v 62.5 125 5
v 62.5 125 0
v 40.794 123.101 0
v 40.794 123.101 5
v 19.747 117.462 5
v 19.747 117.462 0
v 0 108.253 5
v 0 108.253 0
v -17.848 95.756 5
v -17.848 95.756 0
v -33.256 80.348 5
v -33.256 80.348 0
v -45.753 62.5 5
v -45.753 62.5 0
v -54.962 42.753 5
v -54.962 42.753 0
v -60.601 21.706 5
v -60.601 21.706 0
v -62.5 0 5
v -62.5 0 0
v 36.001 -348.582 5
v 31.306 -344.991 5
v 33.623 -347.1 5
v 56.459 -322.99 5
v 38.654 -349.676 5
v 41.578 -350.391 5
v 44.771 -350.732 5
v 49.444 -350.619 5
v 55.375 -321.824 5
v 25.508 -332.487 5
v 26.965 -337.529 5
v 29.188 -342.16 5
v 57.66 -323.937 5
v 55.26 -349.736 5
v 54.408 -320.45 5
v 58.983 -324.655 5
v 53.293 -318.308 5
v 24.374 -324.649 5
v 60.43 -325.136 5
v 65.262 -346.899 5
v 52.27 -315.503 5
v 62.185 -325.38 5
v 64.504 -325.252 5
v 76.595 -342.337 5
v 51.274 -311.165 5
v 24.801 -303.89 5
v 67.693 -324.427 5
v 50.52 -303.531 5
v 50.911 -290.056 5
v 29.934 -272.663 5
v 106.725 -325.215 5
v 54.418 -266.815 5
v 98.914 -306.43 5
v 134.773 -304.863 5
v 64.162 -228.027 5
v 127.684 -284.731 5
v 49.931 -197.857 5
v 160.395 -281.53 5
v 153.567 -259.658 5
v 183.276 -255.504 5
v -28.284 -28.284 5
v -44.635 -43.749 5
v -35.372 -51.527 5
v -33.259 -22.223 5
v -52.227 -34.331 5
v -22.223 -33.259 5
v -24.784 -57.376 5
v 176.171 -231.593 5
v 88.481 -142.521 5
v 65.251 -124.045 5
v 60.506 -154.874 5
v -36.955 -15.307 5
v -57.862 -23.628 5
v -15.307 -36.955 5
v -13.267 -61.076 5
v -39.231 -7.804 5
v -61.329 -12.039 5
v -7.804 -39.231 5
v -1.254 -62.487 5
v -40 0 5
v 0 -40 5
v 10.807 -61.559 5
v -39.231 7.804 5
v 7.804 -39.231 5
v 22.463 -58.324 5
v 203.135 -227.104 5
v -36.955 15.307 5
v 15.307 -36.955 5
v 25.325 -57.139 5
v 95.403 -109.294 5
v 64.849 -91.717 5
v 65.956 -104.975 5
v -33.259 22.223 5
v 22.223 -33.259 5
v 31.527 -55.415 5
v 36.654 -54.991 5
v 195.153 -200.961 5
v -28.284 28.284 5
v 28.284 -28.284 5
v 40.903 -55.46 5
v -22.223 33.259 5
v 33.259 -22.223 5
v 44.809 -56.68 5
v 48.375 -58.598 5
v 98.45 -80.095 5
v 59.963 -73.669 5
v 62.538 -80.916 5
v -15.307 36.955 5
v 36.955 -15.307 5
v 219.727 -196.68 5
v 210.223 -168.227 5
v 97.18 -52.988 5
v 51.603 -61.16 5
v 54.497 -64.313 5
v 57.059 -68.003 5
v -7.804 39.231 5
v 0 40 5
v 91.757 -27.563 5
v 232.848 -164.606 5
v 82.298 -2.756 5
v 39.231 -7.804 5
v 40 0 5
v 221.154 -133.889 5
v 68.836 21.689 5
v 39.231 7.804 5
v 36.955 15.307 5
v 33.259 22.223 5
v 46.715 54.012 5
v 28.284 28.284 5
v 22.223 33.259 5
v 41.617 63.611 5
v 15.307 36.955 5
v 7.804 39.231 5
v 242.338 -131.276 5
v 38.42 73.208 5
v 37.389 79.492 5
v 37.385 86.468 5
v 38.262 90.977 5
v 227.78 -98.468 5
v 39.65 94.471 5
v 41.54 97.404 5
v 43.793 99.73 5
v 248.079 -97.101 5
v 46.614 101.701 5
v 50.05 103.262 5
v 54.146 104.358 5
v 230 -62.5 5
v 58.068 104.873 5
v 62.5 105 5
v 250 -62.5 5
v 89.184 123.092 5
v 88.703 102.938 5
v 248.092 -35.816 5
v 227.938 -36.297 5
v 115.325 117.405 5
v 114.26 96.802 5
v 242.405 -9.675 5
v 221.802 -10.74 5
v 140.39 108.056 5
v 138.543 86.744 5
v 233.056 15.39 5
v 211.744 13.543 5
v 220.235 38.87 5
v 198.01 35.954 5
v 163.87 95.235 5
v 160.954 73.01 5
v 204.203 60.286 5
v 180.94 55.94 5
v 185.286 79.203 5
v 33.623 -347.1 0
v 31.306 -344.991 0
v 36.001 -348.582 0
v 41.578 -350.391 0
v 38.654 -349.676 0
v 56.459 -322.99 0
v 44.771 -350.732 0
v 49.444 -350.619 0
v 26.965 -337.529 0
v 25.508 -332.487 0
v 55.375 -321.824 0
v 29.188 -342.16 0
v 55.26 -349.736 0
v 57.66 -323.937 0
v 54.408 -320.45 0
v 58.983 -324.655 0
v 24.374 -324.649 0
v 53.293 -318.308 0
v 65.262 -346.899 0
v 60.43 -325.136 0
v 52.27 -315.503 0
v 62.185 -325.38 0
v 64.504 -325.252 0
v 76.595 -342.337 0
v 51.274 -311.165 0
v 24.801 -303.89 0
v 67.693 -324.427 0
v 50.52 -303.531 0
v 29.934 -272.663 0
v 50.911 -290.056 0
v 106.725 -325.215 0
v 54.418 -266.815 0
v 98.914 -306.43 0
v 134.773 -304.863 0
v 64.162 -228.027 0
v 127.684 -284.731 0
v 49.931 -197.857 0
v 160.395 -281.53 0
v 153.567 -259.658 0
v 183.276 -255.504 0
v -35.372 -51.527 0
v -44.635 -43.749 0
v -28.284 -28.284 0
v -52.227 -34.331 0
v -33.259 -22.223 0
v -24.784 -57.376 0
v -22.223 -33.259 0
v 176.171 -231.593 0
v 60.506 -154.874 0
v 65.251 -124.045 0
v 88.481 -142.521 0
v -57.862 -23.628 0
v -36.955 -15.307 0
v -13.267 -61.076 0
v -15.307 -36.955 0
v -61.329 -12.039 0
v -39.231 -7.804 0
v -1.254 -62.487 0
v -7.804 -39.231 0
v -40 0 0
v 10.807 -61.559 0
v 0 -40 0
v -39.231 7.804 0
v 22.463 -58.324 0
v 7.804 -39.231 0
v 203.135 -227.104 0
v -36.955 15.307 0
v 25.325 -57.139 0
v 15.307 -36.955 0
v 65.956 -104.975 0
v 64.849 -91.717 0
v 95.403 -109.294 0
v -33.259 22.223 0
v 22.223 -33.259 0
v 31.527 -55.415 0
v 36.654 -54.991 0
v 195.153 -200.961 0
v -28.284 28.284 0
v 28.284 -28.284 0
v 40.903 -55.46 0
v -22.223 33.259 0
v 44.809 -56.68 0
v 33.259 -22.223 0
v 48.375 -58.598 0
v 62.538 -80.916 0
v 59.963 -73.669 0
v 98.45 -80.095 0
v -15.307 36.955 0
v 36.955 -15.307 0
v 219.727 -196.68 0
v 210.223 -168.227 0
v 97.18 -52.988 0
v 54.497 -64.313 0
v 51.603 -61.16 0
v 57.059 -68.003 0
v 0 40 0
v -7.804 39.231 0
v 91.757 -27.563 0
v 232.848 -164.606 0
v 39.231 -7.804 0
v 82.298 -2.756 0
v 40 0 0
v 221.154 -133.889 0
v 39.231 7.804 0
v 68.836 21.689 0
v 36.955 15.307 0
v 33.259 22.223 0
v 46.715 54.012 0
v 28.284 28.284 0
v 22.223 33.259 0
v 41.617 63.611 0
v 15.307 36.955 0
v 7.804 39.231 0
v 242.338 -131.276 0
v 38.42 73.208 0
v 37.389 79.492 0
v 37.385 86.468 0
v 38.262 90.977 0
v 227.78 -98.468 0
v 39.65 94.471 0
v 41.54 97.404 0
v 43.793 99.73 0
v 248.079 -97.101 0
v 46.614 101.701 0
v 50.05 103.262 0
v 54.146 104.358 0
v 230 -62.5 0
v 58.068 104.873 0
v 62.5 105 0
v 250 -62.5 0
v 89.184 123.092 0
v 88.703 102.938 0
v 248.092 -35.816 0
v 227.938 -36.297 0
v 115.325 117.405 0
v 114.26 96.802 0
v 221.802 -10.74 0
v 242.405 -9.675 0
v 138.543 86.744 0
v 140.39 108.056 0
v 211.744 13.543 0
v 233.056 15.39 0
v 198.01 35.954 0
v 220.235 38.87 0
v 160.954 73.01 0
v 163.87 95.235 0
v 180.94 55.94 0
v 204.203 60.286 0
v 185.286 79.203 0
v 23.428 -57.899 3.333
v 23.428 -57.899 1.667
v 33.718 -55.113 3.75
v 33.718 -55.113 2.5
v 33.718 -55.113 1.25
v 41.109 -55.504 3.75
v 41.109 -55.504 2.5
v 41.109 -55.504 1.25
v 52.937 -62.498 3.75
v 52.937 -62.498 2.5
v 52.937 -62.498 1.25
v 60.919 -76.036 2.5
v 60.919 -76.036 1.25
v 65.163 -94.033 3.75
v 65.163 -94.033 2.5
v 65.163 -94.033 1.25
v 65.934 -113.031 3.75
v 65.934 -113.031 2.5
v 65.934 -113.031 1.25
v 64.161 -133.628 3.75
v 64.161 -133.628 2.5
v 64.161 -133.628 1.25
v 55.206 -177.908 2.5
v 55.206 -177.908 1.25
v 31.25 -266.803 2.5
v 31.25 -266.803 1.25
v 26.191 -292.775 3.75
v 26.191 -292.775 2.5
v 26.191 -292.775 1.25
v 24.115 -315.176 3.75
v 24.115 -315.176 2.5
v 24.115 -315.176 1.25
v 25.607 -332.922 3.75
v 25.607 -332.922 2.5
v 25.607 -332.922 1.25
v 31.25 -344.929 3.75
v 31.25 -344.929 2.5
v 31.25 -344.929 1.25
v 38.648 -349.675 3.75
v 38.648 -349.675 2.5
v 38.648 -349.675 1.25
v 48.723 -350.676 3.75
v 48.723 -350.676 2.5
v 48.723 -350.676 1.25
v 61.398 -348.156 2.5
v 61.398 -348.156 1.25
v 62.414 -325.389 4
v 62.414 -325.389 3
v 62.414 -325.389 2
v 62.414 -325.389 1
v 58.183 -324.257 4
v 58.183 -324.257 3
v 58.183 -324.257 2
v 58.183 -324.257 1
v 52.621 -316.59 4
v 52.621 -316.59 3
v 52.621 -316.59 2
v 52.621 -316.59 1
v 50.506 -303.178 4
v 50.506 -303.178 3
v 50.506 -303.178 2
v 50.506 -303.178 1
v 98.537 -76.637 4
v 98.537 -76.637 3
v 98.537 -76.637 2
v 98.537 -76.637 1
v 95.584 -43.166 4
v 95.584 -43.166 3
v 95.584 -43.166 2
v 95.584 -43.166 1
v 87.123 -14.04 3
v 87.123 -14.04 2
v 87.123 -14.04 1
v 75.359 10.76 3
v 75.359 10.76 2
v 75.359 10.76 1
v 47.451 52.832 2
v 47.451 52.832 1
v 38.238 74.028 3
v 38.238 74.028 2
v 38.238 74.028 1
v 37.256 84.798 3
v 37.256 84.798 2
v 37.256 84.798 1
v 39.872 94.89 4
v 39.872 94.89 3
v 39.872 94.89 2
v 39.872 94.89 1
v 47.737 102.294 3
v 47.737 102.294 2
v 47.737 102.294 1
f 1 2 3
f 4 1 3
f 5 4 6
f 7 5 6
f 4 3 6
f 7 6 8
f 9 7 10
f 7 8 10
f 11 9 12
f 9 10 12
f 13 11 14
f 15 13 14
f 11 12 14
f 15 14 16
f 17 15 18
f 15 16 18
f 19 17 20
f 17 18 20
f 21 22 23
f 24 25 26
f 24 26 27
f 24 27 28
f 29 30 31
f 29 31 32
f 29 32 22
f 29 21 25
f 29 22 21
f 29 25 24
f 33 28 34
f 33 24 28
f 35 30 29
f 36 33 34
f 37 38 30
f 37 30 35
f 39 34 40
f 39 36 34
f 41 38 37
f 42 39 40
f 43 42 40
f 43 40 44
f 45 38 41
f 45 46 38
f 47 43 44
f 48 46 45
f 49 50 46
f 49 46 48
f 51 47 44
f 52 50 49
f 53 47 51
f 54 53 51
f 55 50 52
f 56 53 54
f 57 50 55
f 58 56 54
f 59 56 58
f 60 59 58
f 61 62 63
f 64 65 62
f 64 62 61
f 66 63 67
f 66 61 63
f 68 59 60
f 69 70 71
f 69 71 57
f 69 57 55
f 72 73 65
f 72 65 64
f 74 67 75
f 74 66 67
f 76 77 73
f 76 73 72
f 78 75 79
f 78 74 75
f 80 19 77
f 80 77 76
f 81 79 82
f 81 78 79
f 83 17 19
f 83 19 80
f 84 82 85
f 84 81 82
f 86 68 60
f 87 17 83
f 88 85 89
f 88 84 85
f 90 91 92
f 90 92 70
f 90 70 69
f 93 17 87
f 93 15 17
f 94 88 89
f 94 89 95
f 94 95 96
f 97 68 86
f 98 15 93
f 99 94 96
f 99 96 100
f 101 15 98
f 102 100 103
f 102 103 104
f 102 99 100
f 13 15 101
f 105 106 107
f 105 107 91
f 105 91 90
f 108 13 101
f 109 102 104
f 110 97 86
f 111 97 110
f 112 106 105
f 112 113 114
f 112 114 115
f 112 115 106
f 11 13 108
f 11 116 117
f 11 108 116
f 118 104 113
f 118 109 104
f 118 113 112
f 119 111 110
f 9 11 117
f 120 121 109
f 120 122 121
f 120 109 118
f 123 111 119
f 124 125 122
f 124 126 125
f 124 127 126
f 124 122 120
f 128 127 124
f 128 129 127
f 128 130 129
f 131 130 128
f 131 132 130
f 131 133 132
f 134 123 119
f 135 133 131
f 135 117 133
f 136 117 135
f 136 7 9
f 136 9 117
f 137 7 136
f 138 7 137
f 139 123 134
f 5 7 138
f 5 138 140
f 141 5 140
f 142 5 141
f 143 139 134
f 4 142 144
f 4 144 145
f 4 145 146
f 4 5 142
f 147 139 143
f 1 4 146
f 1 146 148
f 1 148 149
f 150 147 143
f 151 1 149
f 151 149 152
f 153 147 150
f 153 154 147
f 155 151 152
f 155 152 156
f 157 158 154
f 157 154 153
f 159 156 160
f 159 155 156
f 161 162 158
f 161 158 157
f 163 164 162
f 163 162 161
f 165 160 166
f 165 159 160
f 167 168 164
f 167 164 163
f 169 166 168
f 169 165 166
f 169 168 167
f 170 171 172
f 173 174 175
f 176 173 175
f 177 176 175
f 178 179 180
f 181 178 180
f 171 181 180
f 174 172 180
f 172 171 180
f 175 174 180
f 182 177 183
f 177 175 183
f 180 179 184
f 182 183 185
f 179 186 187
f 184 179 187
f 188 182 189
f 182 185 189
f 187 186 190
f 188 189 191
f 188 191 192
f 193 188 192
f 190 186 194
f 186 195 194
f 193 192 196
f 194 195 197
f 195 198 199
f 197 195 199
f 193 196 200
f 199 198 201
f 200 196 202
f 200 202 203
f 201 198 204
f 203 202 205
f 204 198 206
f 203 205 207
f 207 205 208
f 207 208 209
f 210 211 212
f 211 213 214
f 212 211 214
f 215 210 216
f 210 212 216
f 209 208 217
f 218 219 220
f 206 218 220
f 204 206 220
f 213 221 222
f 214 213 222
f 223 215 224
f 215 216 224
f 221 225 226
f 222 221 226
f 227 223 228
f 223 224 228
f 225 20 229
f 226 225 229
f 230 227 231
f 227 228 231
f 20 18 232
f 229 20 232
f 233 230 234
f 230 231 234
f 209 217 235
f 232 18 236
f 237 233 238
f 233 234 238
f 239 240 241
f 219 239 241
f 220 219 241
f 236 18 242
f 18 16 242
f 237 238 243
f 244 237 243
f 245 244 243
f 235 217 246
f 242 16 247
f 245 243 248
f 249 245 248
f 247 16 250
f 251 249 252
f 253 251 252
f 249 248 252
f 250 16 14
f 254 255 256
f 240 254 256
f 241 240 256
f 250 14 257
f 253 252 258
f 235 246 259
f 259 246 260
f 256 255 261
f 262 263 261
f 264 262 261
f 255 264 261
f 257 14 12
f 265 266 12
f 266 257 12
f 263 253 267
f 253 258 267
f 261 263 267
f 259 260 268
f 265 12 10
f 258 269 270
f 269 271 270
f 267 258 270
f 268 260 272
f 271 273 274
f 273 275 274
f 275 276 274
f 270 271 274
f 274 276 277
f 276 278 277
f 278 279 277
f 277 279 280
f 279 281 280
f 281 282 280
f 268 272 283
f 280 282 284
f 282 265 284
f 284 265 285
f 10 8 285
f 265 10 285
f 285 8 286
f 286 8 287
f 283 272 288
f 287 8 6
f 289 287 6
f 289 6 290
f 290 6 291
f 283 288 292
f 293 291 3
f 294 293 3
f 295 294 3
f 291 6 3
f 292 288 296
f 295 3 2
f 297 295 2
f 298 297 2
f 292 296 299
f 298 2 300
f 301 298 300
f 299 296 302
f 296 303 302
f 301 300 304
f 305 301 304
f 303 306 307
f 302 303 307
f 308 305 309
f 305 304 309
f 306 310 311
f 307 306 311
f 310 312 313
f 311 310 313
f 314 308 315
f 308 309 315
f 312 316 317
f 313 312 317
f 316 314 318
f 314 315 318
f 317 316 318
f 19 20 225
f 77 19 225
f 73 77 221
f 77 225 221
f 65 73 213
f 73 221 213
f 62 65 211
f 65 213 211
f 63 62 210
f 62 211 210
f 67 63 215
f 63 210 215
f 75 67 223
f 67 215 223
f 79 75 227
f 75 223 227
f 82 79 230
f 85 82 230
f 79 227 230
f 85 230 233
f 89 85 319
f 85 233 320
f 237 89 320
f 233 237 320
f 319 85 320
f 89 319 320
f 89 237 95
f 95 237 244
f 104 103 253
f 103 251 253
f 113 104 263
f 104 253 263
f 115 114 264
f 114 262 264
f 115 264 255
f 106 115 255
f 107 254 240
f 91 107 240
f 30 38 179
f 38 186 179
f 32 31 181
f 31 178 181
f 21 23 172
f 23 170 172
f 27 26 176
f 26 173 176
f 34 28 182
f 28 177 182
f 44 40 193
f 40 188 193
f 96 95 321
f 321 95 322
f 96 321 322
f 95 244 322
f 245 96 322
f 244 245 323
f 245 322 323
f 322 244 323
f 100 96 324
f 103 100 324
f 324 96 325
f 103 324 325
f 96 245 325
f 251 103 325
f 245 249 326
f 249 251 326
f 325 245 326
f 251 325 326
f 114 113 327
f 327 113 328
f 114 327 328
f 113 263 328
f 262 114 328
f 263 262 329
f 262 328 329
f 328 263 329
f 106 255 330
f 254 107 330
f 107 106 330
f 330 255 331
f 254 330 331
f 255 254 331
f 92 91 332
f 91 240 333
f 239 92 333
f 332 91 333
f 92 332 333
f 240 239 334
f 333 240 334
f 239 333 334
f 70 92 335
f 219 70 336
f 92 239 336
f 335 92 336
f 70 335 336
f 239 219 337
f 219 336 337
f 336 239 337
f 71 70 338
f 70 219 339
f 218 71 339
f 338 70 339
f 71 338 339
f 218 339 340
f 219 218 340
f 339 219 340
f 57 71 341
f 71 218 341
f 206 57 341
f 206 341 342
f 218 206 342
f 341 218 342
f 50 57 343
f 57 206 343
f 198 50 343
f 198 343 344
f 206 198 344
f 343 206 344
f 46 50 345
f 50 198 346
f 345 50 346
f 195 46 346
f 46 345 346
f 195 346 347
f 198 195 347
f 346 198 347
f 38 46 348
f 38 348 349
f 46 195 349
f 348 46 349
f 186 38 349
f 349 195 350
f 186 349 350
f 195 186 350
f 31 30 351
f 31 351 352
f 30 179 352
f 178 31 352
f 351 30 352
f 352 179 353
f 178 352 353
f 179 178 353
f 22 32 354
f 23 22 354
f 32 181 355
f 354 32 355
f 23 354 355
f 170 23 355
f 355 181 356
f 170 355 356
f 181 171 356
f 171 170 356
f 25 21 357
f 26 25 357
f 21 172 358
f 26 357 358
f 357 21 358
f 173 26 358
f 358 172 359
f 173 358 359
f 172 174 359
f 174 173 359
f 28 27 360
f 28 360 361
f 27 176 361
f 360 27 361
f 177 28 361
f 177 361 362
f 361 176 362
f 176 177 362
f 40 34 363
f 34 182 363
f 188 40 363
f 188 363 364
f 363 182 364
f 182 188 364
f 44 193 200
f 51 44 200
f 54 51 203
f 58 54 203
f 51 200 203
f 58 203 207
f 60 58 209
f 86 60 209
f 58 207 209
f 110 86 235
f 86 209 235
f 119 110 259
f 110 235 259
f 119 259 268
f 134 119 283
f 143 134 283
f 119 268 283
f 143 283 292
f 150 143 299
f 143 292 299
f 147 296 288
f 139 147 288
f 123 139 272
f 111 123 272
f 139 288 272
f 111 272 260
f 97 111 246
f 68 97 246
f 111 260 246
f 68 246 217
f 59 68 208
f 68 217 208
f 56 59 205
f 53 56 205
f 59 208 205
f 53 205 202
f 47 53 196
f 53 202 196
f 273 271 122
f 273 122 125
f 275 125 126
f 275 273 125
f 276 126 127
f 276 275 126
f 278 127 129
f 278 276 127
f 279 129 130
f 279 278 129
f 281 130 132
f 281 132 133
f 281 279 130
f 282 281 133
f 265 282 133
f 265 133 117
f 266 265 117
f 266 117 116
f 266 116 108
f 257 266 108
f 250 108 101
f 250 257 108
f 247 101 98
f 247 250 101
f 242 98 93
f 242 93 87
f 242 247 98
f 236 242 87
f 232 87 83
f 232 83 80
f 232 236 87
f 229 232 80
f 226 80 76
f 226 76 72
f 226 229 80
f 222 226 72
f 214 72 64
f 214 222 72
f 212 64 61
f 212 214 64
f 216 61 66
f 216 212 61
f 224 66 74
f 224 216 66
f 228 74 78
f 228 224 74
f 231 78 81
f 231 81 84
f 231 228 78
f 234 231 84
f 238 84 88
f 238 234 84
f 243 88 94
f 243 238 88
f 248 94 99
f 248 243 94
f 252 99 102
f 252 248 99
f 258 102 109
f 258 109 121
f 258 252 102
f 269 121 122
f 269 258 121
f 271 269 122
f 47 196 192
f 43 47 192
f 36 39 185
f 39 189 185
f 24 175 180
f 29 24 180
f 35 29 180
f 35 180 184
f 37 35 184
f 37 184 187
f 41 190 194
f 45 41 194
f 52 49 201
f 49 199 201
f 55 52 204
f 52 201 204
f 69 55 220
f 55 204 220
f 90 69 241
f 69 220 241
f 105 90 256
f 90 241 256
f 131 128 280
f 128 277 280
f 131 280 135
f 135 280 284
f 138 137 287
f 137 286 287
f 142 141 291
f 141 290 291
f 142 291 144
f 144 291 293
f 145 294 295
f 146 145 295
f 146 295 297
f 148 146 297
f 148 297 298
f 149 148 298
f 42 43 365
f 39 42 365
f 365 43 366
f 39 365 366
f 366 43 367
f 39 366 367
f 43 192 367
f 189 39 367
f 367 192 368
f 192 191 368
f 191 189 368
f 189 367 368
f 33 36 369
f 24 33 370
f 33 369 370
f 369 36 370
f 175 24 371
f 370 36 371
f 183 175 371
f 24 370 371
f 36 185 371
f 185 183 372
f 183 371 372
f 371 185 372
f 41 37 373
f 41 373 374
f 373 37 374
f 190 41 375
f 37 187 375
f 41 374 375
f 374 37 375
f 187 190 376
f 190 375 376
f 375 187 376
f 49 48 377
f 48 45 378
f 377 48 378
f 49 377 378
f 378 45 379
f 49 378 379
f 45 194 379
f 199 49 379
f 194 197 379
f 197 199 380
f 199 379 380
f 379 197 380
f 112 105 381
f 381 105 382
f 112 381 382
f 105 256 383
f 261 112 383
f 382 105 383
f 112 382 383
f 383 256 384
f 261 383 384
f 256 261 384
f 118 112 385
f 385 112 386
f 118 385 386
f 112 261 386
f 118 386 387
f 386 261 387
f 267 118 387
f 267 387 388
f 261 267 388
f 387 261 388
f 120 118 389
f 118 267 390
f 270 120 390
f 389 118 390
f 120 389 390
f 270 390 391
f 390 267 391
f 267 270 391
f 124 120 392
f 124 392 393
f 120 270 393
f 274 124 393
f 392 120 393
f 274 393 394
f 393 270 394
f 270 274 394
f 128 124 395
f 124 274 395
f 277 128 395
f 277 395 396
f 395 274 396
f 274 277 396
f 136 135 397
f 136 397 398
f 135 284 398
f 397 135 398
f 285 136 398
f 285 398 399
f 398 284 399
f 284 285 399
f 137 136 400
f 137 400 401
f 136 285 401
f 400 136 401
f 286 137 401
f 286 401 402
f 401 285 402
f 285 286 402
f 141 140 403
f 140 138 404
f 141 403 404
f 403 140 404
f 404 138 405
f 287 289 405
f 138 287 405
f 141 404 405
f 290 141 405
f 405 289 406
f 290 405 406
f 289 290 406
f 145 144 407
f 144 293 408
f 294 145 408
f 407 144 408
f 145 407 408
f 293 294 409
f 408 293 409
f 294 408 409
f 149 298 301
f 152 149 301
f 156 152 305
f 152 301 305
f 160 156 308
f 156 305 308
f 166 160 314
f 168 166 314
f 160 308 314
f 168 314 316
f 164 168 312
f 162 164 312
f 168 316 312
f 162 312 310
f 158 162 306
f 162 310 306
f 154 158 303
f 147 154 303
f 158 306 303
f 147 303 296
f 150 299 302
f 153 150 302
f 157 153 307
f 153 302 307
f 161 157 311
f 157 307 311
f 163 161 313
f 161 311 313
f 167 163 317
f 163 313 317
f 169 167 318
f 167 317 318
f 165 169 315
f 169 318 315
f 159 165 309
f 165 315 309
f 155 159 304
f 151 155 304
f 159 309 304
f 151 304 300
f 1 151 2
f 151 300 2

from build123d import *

# Parameters (mm, degrees)
F0_R     = 40
F1_DEPTH = 5


with BuildPart() as f1:
    # F0 (on Top) → F1 (new body)
    with BuildSketch(Plane.XY):
        with BuildLine():
            ThreePointArc((62.5, 125), (-25.8883476483, 88.3883476483), (-62.5, 0))
            ThreePointArc((-62.5, 0), (-35.3718816601, -51.5274682847), (22.4625596104, -58.3239523331))
            add(Edge.make_bspline(
                [(22.4625596104, -58.3239523331), (23.4338104217, -57.8834943524), (24.3880812611, -57.4889863625), (25.3254434787, -57.1390576804)],
                knots=[0, 0, 0, 0, 0.0078086947, 0.0078086947, 0.0078086947, 0.0078086947], degree=3))
            add(Edge.make_bspline(
                [(25.3254434787, -57.1390576804), (49.0548698892, -48.2805750634), (85.7849542145, -104.4302855165), (25.8955771825, -258.4521048553), (19.1129913649, -356.0221825551), (54.6846931143, -352.1963888275), (76.5954563413, -342.3369239847)],
                knots=[0.0078086947, 0.0078086947, 0.0078086947, 0.0078086947, 0.2054866489, 0.5709414839, 0.8143834536, 1, 1, 1, 1], degree=3))
            ThreePointArc((76.5954563413, -342.3369239847), (203.1346928647, -227.1039487578), (250, -62.5))
            ThreePointArc((250, -62.5), (195.0825214725, 70.0825214725), (62.5, 125))
        make_face()
        Circle(F0_R, mode=Mode.SUBTRACT)
        with BuildLine():
            ThreePointArc((62.5, 105), (180.9403858487, 55.9403858487), (230, -62.5))
            ThreePointArc((230, -62.5), (186.1340725214, -216.5692960373), (67.6933471355, -324.4273608496))
            add(Edge.make_bspline(
                [(67.6933471355, -324.4273608496), (52.1590419089, -329.9769233014), (40.1870983678, -267.654203975), (126.5199671093, -78.3907724821), (66.3352424241, 30.3993926076), (32.7769246578, 68.4207557353), (37.4844764475, 105.4154422107), (62.5, 105)],
                knots=[0, 0, 0, 0, 0.1437363374, 0.4686085678, 0.7052388709, 0.8608320173, 1, 1, 1, 1], degree=3))
        make_face(mode=Mode.SUBTRACT)
    extrude(amount=F1_DEPTH)


solid = f1.part
